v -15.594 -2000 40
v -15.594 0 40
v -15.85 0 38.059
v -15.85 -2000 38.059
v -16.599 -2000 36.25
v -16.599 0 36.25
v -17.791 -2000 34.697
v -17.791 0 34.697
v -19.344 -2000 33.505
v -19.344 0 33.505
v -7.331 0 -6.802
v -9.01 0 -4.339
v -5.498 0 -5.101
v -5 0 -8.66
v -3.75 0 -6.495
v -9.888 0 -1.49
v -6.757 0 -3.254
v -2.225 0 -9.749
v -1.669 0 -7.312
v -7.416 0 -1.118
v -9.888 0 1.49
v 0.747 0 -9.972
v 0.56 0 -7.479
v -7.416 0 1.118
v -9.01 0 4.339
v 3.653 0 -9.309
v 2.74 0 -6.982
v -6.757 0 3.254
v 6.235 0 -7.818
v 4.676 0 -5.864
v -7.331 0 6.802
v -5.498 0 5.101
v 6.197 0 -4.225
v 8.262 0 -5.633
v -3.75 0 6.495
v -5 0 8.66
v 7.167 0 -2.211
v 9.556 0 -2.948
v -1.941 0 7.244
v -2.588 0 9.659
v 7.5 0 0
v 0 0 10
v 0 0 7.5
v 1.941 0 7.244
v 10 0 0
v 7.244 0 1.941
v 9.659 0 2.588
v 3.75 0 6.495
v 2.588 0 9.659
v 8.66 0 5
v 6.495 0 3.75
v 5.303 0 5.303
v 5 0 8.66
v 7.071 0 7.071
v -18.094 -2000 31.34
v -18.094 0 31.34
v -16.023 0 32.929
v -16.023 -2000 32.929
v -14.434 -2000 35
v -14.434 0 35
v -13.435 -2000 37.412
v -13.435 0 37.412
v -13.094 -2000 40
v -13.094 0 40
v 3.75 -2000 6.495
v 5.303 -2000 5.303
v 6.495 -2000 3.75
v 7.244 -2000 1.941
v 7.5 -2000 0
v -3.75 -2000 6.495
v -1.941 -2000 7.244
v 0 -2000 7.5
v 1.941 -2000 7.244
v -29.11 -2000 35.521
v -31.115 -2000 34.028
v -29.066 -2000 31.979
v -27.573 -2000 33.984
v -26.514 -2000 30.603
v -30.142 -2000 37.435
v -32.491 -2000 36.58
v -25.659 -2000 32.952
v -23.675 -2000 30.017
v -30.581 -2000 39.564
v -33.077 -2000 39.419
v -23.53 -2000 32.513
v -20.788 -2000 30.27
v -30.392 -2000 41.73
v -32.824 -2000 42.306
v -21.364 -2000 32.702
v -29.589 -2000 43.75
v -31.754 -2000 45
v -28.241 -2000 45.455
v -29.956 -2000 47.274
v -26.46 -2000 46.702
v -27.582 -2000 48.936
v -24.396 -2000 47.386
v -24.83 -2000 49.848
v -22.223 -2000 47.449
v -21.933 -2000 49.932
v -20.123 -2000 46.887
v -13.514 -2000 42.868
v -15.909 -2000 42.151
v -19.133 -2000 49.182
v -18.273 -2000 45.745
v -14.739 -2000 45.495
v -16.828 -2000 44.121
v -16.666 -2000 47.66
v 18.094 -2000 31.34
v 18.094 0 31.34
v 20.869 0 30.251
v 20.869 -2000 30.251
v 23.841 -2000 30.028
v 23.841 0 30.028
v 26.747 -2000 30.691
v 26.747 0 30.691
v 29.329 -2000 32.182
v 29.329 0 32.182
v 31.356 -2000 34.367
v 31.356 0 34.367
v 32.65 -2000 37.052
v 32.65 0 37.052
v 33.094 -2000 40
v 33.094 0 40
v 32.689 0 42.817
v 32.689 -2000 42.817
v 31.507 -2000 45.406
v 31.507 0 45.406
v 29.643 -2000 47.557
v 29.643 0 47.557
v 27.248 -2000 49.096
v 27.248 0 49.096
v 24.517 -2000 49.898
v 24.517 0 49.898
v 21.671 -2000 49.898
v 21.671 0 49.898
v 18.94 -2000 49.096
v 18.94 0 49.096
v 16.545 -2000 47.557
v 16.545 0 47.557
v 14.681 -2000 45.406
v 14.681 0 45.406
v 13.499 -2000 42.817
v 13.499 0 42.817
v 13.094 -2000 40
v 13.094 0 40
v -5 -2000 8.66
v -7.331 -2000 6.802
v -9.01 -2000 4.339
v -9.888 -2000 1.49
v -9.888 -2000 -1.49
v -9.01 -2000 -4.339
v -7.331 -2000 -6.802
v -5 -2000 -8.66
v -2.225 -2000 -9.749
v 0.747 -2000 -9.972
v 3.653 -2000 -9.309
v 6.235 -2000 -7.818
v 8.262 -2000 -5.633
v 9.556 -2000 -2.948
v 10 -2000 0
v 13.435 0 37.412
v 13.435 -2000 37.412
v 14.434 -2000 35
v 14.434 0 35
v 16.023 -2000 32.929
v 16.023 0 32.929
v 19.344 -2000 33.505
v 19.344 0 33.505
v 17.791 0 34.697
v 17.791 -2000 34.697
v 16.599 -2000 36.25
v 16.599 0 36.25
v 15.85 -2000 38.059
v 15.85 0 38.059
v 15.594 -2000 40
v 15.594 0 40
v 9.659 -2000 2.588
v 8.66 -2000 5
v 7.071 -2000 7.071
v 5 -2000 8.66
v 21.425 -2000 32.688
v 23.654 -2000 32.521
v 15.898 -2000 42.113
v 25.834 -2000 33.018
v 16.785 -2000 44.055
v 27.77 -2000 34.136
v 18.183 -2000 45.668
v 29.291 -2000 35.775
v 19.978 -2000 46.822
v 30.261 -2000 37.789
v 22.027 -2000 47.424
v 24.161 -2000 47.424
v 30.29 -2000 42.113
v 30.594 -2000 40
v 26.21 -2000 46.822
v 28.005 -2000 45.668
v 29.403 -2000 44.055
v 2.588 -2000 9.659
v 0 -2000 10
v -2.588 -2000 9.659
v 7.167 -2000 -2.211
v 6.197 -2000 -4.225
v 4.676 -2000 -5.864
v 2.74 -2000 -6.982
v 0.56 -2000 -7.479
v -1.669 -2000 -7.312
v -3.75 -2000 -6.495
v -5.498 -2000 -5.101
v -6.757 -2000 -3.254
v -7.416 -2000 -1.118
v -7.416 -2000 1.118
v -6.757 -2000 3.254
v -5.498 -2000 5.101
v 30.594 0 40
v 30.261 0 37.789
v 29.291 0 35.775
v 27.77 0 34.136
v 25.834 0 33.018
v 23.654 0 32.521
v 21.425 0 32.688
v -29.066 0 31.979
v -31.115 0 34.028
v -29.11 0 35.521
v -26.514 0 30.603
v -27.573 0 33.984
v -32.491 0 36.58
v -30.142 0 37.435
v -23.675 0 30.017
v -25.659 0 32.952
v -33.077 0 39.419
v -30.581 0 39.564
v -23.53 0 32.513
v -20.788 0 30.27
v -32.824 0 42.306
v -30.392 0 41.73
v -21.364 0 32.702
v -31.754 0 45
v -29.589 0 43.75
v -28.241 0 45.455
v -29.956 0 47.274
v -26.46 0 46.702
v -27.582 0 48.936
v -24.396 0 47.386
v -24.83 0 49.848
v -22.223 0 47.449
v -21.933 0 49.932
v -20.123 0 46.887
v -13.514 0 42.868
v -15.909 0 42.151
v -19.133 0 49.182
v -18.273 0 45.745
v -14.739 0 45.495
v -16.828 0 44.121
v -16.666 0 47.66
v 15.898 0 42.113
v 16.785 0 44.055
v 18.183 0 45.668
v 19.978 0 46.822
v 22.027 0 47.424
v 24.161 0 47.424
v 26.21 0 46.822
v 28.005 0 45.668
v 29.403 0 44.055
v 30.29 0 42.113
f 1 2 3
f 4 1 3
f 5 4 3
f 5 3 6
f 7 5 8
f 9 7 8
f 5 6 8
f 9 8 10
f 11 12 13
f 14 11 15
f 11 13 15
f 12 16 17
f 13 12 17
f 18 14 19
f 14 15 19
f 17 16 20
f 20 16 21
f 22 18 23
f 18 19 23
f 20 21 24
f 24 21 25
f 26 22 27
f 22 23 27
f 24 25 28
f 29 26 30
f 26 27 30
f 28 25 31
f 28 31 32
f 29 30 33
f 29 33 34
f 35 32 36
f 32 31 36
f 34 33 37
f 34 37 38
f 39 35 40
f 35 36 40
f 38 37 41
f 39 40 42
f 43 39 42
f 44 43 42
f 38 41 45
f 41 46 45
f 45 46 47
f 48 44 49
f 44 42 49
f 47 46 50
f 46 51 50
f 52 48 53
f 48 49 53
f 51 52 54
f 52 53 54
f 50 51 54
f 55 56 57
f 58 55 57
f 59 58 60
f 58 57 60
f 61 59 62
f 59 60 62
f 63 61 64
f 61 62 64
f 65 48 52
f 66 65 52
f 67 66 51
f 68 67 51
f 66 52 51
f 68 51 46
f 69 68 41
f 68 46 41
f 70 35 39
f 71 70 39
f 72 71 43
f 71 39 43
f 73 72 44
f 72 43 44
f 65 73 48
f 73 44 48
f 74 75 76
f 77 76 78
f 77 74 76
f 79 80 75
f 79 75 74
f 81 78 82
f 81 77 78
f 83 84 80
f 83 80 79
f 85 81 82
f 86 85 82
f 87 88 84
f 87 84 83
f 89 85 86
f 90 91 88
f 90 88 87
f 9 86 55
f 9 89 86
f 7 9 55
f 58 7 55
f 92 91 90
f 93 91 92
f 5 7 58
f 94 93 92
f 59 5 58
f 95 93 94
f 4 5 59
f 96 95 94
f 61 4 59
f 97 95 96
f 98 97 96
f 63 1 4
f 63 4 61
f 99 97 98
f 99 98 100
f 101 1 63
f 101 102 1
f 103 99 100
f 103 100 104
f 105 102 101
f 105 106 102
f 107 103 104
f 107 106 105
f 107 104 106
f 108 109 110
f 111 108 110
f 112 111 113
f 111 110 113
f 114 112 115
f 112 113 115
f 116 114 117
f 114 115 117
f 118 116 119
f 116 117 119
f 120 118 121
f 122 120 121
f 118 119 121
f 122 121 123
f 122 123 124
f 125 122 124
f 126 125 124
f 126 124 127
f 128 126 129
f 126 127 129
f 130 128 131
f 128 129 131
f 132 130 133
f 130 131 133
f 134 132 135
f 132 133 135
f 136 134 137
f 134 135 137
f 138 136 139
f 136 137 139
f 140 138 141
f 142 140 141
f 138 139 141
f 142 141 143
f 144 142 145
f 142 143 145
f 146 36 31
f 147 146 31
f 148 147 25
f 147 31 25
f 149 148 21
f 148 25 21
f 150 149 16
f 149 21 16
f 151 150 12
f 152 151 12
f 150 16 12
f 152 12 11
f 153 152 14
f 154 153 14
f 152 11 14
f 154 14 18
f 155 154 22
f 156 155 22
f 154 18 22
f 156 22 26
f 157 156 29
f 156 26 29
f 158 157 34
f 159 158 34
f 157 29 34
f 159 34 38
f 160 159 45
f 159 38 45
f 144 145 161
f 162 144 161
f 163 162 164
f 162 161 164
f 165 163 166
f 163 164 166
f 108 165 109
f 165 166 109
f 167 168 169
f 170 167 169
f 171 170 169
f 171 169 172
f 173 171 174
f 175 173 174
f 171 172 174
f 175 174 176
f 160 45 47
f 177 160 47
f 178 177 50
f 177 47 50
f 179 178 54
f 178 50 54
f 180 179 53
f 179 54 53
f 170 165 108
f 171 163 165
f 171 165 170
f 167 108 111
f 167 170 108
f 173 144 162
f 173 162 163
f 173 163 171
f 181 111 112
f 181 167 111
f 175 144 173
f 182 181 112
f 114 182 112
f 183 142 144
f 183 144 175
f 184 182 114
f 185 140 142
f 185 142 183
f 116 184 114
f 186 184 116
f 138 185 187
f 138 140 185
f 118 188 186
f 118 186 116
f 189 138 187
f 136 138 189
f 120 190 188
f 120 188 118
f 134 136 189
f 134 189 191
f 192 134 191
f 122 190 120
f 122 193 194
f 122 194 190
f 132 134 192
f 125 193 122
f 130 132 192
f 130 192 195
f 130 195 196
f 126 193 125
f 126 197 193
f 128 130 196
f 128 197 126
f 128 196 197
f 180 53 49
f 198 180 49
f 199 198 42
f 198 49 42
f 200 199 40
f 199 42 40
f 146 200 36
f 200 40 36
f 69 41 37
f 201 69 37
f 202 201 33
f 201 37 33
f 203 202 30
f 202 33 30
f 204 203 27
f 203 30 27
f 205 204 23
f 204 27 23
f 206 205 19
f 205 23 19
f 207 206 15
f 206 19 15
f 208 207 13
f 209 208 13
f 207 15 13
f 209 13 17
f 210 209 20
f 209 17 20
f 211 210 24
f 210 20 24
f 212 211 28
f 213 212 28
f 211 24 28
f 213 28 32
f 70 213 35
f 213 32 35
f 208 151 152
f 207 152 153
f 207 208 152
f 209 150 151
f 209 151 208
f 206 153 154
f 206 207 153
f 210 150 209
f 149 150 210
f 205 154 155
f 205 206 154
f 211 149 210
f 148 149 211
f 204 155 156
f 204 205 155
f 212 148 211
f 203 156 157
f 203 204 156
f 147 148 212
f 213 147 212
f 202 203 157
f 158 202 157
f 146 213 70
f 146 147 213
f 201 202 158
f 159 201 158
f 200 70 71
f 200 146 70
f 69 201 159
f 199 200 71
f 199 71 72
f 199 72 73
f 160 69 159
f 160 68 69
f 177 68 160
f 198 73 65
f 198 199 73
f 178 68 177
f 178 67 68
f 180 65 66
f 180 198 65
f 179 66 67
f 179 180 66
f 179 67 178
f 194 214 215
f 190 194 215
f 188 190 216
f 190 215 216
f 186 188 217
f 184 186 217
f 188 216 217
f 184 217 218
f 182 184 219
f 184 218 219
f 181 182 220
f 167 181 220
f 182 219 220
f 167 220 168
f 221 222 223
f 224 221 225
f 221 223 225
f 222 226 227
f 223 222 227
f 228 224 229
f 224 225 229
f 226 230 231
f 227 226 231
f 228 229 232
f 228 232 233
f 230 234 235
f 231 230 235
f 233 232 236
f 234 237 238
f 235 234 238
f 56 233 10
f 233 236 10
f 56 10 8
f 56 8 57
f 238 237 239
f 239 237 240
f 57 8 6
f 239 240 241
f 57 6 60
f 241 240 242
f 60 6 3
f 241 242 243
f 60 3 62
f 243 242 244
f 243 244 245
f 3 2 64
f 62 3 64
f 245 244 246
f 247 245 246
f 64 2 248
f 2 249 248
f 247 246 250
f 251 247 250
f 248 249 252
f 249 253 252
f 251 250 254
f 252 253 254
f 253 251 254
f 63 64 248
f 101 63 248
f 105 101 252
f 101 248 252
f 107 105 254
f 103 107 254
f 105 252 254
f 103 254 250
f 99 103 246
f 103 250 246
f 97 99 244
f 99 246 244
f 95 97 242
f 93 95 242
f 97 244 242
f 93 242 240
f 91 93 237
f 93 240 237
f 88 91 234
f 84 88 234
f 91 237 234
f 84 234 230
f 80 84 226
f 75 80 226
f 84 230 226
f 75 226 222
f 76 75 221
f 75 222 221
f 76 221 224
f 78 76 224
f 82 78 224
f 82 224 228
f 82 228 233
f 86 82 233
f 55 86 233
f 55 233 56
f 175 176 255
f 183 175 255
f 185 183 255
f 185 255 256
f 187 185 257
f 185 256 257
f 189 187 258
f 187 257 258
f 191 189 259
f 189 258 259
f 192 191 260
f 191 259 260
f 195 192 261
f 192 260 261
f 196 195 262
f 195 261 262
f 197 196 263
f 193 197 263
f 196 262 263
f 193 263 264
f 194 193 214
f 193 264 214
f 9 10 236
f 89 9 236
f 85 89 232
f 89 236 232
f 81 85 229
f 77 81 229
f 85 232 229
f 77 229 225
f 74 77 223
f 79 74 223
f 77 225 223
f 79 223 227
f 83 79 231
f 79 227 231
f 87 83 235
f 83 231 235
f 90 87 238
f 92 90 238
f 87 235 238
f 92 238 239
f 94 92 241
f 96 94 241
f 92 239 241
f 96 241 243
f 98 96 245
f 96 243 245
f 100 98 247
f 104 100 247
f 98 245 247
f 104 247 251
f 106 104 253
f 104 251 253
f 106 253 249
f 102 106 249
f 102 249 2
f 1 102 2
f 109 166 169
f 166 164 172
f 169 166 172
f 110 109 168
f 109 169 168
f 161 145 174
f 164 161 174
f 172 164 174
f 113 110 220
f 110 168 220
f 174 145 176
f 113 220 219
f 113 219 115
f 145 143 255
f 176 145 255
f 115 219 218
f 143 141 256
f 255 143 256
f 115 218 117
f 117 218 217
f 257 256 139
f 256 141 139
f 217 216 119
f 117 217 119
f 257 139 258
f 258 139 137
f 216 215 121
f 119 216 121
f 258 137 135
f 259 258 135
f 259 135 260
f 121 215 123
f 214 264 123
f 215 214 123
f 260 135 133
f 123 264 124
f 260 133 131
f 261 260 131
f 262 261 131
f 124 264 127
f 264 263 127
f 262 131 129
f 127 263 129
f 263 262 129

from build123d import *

# Parameters (mm, degrees)
F1_DEPTH = 2000


with BuildPart() as f1:
    # F0 (on Front) → F1 (new body)
    with BuildSketch(Plane.XZ):
        with BuildLine():
            Line((-19.344011, 33.504809), (-18.094011, 31.339746))
            ThreePointArc((-18.094011, 31.339746), (-14.433757, 35), (-13.094011, 40))
            Line((-13.094011, 40), (-15.594011, 40))
            ThreePointArc((-15.594011, 40), (-16.59882, 36.25), (-19.344011, 33.504809))
        make_face()
        with BuildLine():
            ThreePointArc((-13.094011, 40), (-31.754265, 45), (-18.094011, 31.339746))
            Line((-18.094011, 31.339746), (-19.344011, 33.504809))
            ThreePointArc((-19.344011, 33.504809), (-29.589201, 43.75), (-15.594011, 40))
            Line((-15.594011, 40), (-13.094011, 40))
        make_face()
        with BuildLine():
            ThreePointArc((13.094011, 40), (14.433757, 35), (18.094011, 31.339746))
            Line((18.094011, 31.339746), (19.344011, 33.504809))
            ThreePointArc((19.344011, 33.504809), (16.59882, 36.25), (15.594011, 40))
            Line((15.594011, 40), (13.094011, 40))
        make_face()
        with BuildLine():
            Line((19.344011, 33.504809), (18.094011, 31.339746))
            ThreePointArc((18.094011, 31.339746), (28.094011, 31.339746), (33.094011, 40))
            ThreePointArc((33.094011, 40), (23.094011, 50), (13.094011, 40))
            Line((13.094011, 40), (15.594011, 40))
            ThreePointArc((15.594011, 40), (23.094011, 47.5), (30.594011, 40))
            ThreePointArc((30.594011, 40), (26.844011, 33.504809), (19.344011, 33.504809))
        make_face()
        with BuildLine():
            ThreePointArc((-5, 8.660254), (-5, -8.660254), (10, 0))
            ThreePointArc((10, 0), (8.660254, 5), (5, 8.660254))
            Line((5, 8.660254), (3.75, 6.495191))
            ThreePointArc((3.75, 6.495191), (6.495191, 3.75), (7.5, 0))
            ThreePointArc((7.5, 0), (-3.75, -6.495191), (-3.75, 6.495191))
            Line((-3.75, 6.495191), (-5, 8.660254))
        make_face()
        with BuildLine():
            Line((3.75, 6.495191), (5, 8.660254))
            ThreePointArc((5, 8.660254), (0, 10), (-5, 8.660254))
            Line((-5, 8.660254), (-3.75, 6.495191))
            ThreePointArc((-3.75, 6.495191), (0, 7.5), (3.75, 6.495191))
        make_face()
    extrude(amount=F1_DEPTH)


solid = f1.part
